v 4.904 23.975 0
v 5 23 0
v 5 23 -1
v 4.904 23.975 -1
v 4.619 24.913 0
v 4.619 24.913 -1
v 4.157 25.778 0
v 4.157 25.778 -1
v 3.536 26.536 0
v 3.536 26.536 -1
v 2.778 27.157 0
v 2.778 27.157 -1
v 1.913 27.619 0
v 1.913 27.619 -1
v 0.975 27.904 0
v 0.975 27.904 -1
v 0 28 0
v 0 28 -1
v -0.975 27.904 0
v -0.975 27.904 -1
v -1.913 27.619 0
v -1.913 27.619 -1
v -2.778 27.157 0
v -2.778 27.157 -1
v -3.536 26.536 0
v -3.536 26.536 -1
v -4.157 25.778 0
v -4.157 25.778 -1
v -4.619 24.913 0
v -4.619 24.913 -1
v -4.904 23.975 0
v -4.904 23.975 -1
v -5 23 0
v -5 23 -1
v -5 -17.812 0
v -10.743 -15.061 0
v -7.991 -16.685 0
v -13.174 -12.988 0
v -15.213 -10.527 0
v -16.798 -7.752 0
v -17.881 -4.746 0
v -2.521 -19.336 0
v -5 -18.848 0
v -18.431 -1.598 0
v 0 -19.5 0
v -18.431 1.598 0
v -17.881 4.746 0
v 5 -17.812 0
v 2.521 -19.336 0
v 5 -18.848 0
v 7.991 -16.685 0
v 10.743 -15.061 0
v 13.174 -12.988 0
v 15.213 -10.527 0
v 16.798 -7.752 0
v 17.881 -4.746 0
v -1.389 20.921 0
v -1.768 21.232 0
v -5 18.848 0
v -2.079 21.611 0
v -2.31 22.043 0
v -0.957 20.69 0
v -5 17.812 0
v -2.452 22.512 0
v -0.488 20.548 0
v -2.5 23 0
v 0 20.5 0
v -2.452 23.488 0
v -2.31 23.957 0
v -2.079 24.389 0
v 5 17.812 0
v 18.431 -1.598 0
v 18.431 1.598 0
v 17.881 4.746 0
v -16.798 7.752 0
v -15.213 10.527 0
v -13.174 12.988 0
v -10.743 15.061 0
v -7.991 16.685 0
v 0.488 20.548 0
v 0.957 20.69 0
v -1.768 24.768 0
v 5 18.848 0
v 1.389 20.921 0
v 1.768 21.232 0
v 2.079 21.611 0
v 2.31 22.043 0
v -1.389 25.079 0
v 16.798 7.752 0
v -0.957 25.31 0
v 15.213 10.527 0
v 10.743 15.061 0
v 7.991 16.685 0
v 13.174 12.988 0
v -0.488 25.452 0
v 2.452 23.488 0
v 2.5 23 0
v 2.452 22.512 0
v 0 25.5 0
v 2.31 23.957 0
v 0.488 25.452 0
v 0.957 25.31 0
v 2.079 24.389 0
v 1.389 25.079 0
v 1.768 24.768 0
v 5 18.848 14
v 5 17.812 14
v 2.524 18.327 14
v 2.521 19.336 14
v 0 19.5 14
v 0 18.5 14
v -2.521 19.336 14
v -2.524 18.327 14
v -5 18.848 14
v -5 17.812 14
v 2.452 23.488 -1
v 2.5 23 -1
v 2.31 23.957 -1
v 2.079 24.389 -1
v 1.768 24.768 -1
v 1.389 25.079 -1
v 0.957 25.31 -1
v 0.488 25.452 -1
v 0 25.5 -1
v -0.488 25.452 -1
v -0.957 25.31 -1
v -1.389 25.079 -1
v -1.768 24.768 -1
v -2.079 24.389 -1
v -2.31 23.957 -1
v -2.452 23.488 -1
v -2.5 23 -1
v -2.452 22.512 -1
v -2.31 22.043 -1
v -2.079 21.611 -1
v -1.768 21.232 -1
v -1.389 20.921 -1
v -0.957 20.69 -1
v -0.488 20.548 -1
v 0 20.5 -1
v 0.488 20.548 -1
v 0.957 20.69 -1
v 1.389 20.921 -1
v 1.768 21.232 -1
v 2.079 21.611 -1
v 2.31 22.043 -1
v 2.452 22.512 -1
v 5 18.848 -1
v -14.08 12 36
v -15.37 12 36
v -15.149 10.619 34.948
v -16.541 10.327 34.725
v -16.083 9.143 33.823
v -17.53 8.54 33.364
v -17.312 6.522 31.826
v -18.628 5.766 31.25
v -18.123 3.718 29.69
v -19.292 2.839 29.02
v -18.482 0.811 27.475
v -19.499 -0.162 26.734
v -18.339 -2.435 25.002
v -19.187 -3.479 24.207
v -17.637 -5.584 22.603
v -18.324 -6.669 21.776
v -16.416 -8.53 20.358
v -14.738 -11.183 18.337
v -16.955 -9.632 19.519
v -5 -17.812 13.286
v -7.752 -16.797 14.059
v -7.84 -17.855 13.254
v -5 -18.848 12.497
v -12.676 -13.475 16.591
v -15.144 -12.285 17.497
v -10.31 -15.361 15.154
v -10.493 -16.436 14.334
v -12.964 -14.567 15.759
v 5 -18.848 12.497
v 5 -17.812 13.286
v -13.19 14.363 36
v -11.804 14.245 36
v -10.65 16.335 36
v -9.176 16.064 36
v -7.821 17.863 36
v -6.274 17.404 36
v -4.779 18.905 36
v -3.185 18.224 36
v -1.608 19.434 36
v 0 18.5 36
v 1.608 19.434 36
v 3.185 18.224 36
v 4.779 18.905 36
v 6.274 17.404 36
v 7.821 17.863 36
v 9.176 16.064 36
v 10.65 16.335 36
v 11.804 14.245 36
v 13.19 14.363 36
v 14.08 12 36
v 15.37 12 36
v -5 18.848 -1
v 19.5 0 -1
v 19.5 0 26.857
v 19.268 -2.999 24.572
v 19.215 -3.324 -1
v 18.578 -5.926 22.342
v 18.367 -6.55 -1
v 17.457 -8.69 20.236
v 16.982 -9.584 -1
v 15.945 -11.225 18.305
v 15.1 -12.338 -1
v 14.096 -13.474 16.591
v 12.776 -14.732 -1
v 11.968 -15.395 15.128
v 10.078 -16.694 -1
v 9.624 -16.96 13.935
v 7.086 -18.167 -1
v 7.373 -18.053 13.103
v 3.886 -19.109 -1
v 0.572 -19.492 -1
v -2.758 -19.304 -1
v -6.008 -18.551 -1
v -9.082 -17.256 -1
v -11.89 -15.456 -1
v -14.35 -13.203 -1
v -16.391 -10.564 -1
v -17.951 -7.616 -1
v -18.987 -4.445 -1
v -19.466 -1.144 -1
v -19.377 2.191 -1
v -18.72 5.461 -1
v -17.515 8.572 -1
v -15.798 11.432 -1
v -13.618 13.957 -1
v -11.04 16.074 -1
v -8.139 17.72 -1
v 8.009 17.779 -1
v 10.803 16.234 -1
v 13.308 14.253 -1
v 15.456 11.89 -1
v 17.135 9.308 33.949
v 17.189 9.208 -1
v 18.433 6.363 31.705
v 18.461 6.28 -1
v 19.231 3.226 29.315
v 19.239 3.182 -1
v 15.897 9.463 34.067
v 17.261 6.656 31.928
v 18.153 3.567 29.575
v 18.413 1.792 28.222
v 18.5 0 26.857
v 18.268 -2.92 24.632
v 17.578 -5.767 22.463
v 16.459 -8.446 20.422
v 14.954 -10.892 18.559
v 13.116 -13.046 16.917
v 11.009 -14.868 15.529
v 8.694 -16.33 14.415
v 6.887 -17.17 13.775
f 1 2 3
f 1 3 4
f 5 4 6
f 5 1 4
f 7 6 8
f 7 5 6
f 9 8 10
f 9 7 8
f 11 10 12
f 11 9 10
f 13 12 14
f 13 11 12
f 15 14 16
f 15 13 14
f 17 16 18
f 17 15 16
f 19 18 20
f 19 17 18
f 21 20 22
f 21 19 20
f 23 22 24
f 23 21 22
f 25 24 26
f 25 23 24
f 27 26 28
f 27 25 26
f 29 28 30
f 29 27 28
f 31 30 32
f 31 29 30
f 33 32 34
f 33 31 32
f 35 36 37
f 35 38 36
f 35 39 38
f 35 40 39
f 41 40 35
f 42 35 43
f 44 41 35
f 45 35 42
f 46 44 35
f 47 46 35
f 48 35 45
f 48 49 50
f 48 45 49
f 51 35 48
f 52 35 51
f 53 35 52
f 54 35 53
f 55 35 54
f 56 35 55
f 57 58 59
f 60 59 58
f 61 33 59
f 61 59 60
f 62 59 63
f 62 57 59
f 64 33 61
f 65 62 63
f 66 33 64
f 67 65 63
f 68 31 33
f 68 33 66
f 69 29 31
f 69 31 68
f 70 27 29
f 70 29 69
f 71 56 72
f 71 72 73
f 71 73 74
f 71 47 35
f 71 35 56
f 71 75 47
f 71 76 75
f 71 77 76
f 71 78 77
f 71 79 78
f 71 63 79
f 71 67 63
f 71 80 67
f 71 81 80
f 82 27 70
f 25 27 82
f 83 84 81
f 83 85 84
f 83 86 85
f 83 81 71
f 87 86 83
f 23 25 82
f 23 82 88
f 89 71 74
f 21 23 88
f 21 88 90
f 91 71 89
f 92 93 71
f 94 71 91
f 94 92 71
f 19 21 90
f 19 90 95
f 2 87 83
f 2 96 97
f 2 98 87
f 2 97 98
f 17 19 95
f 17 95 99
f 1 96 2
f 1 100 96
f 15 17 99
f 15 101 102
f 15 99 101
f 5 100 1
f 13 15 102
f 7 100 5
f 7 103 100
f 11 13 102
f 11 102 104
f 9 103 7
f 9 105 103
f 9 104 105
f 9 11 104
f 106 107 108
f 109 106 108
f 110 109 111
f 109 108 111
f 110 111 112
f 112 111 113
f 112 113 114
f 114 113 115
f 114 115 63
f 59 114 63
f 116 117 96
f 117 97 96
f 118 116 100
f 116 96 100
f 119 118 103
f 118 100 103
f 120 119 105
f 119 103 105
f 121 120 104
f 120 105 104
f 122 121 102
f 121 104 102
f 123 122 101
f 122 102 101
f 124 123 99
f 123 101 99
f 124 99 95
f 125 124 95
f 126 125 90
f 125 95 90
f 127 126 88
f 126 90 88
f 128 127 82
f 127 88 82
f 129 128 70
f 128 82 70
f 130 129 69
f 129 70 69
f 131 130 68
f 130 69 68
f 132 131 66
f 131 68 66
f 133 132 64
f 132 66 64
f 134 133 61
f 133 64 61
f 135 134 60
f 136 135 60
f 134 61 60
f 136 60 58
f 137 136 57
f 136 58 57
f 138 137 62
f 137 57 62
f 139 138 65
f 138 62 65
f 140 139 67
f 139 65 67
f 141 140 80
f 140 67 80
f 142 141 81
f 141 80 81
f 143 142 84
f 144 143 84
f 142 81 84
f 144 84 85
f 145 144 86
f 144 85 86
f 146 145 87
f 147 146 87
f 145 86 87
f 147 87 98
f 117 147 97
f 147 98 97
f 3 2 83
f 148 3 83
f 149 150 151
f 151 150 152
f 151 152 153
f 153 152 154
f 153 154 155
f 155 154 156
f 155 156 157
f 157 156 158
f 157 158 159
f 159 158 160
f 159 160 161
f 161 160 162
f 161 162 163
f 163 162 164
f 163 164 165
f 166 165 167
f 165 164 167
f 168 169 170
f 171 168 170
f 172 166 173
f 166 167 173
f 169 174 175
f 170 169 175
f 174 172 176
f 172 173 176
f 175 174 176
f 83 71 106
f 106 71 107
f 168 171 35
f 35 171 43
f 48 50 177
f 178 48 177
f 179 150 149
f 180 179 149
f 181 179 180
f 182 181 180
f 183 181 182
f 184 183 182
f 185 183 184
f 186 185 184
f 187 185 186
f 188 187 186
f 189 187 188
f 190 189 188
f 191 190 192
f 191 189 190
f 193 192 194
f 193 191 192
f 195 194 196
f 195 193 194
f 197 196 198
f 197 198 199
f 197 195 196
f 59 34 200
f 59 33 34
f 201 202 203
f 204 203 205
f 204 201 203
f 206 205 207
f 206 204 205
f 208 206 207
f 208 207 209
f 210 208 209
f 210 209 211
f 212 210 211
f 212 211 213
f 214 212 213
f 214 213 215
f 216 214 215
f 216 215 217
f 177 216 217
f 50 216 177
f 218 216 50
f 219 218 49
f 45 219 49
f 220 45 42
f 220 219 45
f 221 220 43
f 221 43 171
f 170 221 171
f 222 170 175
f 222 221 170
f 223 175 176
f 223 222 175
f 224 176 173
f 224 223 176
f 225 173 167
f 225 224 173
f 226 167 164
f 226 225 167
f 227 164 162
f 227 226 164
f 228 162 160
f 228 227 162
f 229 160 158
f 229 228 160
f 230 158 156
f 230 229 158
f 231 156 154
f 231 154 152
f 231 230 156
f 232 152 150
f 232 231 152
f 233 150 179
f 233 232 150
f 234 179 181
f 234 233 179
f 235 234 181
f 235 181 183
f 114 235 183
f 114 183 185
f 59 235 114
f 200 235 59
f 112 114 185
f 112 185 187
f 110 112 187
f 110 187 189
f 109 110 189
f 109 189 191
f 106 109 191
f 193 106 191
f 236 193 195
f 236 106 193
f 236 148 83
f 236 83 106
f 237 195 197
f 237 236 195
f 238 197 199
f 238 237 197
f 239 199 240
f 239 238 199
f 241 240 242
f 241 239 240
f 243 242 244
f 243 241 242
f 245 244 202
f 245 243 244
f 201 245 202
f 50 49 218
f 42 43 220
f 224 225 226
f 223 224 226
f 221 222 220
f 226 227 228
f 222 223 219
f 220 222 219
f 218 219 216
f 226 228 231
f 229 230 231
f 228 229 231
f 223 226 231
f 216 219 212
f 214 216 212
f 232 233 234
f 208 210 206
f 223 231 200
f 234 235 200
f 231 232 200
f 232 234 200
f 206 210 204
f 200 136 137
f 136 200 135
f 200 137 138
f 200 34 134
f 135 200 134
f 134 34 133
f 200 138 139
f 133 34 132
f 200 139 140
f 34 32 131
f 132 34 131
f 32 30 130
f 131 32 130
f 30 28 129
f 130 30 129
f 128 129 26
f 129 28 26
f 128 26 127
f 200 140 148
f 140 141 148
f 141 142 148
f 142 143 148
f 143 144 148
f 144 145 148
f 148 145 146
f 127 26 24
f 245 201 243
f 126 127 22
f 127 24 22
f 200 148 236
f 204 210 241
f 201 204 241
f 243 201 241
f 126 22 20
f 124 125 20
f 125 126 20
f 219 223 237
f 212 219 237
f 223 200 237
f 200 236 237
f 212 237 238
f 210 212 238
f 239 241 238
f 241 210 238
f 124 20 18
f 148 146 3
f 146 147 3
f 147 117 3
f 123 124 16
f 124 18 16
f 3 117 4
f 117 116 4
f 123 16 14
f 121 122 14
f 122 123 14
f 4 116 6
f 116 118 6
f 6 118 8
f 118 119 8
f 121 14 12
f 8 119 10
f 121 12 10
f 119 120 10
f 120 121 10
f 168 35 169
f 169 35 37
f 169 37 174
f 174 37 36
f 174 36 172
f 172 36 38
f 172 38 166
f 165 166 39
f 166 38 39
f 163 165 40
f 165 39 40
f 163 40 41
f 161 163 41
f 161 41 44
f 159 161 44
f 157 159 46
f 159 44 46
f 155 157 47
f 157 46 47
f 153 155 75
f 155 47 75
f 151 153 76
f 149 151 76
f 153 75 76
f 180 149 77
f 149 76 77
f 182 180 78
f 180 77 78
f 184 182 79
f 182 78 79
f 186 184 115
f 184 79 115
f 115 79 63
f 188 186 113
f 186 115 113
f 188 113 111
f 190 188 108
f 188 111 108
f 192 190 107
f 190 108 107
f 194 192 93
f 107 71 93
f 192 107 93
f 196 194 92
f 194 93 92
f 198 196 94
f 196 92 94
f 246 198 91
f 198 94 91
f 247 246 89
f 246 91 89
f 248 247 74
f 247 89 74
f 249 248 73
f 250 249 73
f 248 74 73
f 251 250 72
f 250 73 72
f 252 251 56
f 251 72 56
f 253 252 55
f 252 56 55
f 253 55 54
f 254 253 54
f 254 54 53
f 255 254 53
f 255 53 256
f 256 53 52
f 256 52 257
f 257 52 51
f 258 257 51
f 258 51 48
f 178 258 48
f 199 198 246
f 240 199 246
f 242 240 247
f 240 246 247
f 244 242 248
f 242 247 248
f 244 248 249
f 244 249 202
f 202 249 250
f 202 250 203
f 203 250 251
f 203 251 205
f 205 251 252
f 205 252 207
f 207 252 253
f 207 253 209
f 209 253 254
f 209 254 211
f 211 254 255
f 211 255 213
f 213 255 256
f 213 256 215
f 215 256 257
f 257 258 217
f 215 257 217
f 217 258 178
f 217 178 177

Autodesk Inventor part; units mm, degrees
ref_plane "YZ Plane" through (0, 0, 0) normal (1, 0, 0) x (0, 1, 0)
ref_plane "XZ Plane" through (0, 0, 0) normal (0, 1, 0) x (-1, 0, 0)
ref_plane "XY Plane" through (0, 0, 0) normal (0, 0, 1) x (1, 0, 0)
sketch "Sketch1" plane through (0, 0, 0) normal (0, 0, 1) x (1, 0, 0)
  circle A0 centre (0, 0) radius 18.5
  circle A1 centre (0, 0) radius 19.5
  line L0 (0, 0) -> (0, 25.1943)
  arc A2 (5, 23) -> (-5, 23) centre (0, 23) ccw
  line L1 (5, 23) -> (5, 18.8481)
  line L2 (-5, 23) -> (-5, 18.8481)
  circle A3 centre (0, 23) radius 2.5
  point P0 (-5, 25.1943)
  point P1 (5, 25.1943)
  dimension "d0" = 37
  dimension "d1" = 1
  dimension "d16" = 10
  dimension "d17" = 23
  dimension "d18" = 5
extrude "Extrusion1" add sketch "Sketch1" against normal blind 1 contours A0 | A1
extrude "Extrusion2" add sketch "Sketch1" along normal blind 36 contours A1
sketch "Sketch2" plane through (0, 0, 0) normal (1, 0, 0) x (0, 1, 0)
  line L0 (19.5, 36) -> (-19.5, 36) projected
  line L1 (12, 36) -> (-19.5, 12)
  line L2 (-19.5, 36) -> (-19.5, -1) projected
  line L3 (12, 36) -> (19.5, 36)
  line L4 (-19.5, 12) -> (-19.5, -1)
  line L5 (-19.5, -1) -> (19.5, -1) projected
  line L6 (-19.5, -1) -> (19.5, -1)
  line L7 (19.5, -1) -> (19.5, 36)
  point P0 (0, 0)
  dimension "d7" = 12
  dimension "d8" = 12
extrude "Extrusion3" cut sketch "Sketch2" along normal mid plane 50 contours L1 L2 L0
sketch "Sketch3" plane through (0, 0, 0) normal (0, 1, 0) x (-1, 0, 0)
  line L0 (18.5, 0) -> (-18.5, 0) projected
  line L1 (5, 0) -> (-5, 0)
  line L2 (-5, 0) -> (-5, 14)
  line L3 (-5, 14) -> (5, 14)
  line L4 (5, 14) -> (5, 0)
  point P0 (0, 0)
  dimension "d11" = 5
  dimension "d12" = 10
  dimension "d13" = 14
extrude "Extrusion4" cut sketch "Sketch3" along normal mid plane 50
extrude "Extrusion5" add sketch "Sketch1" against normal blind 1 contours A1 L2 A2 L1
properties part number "CatWaterSensorCase"
